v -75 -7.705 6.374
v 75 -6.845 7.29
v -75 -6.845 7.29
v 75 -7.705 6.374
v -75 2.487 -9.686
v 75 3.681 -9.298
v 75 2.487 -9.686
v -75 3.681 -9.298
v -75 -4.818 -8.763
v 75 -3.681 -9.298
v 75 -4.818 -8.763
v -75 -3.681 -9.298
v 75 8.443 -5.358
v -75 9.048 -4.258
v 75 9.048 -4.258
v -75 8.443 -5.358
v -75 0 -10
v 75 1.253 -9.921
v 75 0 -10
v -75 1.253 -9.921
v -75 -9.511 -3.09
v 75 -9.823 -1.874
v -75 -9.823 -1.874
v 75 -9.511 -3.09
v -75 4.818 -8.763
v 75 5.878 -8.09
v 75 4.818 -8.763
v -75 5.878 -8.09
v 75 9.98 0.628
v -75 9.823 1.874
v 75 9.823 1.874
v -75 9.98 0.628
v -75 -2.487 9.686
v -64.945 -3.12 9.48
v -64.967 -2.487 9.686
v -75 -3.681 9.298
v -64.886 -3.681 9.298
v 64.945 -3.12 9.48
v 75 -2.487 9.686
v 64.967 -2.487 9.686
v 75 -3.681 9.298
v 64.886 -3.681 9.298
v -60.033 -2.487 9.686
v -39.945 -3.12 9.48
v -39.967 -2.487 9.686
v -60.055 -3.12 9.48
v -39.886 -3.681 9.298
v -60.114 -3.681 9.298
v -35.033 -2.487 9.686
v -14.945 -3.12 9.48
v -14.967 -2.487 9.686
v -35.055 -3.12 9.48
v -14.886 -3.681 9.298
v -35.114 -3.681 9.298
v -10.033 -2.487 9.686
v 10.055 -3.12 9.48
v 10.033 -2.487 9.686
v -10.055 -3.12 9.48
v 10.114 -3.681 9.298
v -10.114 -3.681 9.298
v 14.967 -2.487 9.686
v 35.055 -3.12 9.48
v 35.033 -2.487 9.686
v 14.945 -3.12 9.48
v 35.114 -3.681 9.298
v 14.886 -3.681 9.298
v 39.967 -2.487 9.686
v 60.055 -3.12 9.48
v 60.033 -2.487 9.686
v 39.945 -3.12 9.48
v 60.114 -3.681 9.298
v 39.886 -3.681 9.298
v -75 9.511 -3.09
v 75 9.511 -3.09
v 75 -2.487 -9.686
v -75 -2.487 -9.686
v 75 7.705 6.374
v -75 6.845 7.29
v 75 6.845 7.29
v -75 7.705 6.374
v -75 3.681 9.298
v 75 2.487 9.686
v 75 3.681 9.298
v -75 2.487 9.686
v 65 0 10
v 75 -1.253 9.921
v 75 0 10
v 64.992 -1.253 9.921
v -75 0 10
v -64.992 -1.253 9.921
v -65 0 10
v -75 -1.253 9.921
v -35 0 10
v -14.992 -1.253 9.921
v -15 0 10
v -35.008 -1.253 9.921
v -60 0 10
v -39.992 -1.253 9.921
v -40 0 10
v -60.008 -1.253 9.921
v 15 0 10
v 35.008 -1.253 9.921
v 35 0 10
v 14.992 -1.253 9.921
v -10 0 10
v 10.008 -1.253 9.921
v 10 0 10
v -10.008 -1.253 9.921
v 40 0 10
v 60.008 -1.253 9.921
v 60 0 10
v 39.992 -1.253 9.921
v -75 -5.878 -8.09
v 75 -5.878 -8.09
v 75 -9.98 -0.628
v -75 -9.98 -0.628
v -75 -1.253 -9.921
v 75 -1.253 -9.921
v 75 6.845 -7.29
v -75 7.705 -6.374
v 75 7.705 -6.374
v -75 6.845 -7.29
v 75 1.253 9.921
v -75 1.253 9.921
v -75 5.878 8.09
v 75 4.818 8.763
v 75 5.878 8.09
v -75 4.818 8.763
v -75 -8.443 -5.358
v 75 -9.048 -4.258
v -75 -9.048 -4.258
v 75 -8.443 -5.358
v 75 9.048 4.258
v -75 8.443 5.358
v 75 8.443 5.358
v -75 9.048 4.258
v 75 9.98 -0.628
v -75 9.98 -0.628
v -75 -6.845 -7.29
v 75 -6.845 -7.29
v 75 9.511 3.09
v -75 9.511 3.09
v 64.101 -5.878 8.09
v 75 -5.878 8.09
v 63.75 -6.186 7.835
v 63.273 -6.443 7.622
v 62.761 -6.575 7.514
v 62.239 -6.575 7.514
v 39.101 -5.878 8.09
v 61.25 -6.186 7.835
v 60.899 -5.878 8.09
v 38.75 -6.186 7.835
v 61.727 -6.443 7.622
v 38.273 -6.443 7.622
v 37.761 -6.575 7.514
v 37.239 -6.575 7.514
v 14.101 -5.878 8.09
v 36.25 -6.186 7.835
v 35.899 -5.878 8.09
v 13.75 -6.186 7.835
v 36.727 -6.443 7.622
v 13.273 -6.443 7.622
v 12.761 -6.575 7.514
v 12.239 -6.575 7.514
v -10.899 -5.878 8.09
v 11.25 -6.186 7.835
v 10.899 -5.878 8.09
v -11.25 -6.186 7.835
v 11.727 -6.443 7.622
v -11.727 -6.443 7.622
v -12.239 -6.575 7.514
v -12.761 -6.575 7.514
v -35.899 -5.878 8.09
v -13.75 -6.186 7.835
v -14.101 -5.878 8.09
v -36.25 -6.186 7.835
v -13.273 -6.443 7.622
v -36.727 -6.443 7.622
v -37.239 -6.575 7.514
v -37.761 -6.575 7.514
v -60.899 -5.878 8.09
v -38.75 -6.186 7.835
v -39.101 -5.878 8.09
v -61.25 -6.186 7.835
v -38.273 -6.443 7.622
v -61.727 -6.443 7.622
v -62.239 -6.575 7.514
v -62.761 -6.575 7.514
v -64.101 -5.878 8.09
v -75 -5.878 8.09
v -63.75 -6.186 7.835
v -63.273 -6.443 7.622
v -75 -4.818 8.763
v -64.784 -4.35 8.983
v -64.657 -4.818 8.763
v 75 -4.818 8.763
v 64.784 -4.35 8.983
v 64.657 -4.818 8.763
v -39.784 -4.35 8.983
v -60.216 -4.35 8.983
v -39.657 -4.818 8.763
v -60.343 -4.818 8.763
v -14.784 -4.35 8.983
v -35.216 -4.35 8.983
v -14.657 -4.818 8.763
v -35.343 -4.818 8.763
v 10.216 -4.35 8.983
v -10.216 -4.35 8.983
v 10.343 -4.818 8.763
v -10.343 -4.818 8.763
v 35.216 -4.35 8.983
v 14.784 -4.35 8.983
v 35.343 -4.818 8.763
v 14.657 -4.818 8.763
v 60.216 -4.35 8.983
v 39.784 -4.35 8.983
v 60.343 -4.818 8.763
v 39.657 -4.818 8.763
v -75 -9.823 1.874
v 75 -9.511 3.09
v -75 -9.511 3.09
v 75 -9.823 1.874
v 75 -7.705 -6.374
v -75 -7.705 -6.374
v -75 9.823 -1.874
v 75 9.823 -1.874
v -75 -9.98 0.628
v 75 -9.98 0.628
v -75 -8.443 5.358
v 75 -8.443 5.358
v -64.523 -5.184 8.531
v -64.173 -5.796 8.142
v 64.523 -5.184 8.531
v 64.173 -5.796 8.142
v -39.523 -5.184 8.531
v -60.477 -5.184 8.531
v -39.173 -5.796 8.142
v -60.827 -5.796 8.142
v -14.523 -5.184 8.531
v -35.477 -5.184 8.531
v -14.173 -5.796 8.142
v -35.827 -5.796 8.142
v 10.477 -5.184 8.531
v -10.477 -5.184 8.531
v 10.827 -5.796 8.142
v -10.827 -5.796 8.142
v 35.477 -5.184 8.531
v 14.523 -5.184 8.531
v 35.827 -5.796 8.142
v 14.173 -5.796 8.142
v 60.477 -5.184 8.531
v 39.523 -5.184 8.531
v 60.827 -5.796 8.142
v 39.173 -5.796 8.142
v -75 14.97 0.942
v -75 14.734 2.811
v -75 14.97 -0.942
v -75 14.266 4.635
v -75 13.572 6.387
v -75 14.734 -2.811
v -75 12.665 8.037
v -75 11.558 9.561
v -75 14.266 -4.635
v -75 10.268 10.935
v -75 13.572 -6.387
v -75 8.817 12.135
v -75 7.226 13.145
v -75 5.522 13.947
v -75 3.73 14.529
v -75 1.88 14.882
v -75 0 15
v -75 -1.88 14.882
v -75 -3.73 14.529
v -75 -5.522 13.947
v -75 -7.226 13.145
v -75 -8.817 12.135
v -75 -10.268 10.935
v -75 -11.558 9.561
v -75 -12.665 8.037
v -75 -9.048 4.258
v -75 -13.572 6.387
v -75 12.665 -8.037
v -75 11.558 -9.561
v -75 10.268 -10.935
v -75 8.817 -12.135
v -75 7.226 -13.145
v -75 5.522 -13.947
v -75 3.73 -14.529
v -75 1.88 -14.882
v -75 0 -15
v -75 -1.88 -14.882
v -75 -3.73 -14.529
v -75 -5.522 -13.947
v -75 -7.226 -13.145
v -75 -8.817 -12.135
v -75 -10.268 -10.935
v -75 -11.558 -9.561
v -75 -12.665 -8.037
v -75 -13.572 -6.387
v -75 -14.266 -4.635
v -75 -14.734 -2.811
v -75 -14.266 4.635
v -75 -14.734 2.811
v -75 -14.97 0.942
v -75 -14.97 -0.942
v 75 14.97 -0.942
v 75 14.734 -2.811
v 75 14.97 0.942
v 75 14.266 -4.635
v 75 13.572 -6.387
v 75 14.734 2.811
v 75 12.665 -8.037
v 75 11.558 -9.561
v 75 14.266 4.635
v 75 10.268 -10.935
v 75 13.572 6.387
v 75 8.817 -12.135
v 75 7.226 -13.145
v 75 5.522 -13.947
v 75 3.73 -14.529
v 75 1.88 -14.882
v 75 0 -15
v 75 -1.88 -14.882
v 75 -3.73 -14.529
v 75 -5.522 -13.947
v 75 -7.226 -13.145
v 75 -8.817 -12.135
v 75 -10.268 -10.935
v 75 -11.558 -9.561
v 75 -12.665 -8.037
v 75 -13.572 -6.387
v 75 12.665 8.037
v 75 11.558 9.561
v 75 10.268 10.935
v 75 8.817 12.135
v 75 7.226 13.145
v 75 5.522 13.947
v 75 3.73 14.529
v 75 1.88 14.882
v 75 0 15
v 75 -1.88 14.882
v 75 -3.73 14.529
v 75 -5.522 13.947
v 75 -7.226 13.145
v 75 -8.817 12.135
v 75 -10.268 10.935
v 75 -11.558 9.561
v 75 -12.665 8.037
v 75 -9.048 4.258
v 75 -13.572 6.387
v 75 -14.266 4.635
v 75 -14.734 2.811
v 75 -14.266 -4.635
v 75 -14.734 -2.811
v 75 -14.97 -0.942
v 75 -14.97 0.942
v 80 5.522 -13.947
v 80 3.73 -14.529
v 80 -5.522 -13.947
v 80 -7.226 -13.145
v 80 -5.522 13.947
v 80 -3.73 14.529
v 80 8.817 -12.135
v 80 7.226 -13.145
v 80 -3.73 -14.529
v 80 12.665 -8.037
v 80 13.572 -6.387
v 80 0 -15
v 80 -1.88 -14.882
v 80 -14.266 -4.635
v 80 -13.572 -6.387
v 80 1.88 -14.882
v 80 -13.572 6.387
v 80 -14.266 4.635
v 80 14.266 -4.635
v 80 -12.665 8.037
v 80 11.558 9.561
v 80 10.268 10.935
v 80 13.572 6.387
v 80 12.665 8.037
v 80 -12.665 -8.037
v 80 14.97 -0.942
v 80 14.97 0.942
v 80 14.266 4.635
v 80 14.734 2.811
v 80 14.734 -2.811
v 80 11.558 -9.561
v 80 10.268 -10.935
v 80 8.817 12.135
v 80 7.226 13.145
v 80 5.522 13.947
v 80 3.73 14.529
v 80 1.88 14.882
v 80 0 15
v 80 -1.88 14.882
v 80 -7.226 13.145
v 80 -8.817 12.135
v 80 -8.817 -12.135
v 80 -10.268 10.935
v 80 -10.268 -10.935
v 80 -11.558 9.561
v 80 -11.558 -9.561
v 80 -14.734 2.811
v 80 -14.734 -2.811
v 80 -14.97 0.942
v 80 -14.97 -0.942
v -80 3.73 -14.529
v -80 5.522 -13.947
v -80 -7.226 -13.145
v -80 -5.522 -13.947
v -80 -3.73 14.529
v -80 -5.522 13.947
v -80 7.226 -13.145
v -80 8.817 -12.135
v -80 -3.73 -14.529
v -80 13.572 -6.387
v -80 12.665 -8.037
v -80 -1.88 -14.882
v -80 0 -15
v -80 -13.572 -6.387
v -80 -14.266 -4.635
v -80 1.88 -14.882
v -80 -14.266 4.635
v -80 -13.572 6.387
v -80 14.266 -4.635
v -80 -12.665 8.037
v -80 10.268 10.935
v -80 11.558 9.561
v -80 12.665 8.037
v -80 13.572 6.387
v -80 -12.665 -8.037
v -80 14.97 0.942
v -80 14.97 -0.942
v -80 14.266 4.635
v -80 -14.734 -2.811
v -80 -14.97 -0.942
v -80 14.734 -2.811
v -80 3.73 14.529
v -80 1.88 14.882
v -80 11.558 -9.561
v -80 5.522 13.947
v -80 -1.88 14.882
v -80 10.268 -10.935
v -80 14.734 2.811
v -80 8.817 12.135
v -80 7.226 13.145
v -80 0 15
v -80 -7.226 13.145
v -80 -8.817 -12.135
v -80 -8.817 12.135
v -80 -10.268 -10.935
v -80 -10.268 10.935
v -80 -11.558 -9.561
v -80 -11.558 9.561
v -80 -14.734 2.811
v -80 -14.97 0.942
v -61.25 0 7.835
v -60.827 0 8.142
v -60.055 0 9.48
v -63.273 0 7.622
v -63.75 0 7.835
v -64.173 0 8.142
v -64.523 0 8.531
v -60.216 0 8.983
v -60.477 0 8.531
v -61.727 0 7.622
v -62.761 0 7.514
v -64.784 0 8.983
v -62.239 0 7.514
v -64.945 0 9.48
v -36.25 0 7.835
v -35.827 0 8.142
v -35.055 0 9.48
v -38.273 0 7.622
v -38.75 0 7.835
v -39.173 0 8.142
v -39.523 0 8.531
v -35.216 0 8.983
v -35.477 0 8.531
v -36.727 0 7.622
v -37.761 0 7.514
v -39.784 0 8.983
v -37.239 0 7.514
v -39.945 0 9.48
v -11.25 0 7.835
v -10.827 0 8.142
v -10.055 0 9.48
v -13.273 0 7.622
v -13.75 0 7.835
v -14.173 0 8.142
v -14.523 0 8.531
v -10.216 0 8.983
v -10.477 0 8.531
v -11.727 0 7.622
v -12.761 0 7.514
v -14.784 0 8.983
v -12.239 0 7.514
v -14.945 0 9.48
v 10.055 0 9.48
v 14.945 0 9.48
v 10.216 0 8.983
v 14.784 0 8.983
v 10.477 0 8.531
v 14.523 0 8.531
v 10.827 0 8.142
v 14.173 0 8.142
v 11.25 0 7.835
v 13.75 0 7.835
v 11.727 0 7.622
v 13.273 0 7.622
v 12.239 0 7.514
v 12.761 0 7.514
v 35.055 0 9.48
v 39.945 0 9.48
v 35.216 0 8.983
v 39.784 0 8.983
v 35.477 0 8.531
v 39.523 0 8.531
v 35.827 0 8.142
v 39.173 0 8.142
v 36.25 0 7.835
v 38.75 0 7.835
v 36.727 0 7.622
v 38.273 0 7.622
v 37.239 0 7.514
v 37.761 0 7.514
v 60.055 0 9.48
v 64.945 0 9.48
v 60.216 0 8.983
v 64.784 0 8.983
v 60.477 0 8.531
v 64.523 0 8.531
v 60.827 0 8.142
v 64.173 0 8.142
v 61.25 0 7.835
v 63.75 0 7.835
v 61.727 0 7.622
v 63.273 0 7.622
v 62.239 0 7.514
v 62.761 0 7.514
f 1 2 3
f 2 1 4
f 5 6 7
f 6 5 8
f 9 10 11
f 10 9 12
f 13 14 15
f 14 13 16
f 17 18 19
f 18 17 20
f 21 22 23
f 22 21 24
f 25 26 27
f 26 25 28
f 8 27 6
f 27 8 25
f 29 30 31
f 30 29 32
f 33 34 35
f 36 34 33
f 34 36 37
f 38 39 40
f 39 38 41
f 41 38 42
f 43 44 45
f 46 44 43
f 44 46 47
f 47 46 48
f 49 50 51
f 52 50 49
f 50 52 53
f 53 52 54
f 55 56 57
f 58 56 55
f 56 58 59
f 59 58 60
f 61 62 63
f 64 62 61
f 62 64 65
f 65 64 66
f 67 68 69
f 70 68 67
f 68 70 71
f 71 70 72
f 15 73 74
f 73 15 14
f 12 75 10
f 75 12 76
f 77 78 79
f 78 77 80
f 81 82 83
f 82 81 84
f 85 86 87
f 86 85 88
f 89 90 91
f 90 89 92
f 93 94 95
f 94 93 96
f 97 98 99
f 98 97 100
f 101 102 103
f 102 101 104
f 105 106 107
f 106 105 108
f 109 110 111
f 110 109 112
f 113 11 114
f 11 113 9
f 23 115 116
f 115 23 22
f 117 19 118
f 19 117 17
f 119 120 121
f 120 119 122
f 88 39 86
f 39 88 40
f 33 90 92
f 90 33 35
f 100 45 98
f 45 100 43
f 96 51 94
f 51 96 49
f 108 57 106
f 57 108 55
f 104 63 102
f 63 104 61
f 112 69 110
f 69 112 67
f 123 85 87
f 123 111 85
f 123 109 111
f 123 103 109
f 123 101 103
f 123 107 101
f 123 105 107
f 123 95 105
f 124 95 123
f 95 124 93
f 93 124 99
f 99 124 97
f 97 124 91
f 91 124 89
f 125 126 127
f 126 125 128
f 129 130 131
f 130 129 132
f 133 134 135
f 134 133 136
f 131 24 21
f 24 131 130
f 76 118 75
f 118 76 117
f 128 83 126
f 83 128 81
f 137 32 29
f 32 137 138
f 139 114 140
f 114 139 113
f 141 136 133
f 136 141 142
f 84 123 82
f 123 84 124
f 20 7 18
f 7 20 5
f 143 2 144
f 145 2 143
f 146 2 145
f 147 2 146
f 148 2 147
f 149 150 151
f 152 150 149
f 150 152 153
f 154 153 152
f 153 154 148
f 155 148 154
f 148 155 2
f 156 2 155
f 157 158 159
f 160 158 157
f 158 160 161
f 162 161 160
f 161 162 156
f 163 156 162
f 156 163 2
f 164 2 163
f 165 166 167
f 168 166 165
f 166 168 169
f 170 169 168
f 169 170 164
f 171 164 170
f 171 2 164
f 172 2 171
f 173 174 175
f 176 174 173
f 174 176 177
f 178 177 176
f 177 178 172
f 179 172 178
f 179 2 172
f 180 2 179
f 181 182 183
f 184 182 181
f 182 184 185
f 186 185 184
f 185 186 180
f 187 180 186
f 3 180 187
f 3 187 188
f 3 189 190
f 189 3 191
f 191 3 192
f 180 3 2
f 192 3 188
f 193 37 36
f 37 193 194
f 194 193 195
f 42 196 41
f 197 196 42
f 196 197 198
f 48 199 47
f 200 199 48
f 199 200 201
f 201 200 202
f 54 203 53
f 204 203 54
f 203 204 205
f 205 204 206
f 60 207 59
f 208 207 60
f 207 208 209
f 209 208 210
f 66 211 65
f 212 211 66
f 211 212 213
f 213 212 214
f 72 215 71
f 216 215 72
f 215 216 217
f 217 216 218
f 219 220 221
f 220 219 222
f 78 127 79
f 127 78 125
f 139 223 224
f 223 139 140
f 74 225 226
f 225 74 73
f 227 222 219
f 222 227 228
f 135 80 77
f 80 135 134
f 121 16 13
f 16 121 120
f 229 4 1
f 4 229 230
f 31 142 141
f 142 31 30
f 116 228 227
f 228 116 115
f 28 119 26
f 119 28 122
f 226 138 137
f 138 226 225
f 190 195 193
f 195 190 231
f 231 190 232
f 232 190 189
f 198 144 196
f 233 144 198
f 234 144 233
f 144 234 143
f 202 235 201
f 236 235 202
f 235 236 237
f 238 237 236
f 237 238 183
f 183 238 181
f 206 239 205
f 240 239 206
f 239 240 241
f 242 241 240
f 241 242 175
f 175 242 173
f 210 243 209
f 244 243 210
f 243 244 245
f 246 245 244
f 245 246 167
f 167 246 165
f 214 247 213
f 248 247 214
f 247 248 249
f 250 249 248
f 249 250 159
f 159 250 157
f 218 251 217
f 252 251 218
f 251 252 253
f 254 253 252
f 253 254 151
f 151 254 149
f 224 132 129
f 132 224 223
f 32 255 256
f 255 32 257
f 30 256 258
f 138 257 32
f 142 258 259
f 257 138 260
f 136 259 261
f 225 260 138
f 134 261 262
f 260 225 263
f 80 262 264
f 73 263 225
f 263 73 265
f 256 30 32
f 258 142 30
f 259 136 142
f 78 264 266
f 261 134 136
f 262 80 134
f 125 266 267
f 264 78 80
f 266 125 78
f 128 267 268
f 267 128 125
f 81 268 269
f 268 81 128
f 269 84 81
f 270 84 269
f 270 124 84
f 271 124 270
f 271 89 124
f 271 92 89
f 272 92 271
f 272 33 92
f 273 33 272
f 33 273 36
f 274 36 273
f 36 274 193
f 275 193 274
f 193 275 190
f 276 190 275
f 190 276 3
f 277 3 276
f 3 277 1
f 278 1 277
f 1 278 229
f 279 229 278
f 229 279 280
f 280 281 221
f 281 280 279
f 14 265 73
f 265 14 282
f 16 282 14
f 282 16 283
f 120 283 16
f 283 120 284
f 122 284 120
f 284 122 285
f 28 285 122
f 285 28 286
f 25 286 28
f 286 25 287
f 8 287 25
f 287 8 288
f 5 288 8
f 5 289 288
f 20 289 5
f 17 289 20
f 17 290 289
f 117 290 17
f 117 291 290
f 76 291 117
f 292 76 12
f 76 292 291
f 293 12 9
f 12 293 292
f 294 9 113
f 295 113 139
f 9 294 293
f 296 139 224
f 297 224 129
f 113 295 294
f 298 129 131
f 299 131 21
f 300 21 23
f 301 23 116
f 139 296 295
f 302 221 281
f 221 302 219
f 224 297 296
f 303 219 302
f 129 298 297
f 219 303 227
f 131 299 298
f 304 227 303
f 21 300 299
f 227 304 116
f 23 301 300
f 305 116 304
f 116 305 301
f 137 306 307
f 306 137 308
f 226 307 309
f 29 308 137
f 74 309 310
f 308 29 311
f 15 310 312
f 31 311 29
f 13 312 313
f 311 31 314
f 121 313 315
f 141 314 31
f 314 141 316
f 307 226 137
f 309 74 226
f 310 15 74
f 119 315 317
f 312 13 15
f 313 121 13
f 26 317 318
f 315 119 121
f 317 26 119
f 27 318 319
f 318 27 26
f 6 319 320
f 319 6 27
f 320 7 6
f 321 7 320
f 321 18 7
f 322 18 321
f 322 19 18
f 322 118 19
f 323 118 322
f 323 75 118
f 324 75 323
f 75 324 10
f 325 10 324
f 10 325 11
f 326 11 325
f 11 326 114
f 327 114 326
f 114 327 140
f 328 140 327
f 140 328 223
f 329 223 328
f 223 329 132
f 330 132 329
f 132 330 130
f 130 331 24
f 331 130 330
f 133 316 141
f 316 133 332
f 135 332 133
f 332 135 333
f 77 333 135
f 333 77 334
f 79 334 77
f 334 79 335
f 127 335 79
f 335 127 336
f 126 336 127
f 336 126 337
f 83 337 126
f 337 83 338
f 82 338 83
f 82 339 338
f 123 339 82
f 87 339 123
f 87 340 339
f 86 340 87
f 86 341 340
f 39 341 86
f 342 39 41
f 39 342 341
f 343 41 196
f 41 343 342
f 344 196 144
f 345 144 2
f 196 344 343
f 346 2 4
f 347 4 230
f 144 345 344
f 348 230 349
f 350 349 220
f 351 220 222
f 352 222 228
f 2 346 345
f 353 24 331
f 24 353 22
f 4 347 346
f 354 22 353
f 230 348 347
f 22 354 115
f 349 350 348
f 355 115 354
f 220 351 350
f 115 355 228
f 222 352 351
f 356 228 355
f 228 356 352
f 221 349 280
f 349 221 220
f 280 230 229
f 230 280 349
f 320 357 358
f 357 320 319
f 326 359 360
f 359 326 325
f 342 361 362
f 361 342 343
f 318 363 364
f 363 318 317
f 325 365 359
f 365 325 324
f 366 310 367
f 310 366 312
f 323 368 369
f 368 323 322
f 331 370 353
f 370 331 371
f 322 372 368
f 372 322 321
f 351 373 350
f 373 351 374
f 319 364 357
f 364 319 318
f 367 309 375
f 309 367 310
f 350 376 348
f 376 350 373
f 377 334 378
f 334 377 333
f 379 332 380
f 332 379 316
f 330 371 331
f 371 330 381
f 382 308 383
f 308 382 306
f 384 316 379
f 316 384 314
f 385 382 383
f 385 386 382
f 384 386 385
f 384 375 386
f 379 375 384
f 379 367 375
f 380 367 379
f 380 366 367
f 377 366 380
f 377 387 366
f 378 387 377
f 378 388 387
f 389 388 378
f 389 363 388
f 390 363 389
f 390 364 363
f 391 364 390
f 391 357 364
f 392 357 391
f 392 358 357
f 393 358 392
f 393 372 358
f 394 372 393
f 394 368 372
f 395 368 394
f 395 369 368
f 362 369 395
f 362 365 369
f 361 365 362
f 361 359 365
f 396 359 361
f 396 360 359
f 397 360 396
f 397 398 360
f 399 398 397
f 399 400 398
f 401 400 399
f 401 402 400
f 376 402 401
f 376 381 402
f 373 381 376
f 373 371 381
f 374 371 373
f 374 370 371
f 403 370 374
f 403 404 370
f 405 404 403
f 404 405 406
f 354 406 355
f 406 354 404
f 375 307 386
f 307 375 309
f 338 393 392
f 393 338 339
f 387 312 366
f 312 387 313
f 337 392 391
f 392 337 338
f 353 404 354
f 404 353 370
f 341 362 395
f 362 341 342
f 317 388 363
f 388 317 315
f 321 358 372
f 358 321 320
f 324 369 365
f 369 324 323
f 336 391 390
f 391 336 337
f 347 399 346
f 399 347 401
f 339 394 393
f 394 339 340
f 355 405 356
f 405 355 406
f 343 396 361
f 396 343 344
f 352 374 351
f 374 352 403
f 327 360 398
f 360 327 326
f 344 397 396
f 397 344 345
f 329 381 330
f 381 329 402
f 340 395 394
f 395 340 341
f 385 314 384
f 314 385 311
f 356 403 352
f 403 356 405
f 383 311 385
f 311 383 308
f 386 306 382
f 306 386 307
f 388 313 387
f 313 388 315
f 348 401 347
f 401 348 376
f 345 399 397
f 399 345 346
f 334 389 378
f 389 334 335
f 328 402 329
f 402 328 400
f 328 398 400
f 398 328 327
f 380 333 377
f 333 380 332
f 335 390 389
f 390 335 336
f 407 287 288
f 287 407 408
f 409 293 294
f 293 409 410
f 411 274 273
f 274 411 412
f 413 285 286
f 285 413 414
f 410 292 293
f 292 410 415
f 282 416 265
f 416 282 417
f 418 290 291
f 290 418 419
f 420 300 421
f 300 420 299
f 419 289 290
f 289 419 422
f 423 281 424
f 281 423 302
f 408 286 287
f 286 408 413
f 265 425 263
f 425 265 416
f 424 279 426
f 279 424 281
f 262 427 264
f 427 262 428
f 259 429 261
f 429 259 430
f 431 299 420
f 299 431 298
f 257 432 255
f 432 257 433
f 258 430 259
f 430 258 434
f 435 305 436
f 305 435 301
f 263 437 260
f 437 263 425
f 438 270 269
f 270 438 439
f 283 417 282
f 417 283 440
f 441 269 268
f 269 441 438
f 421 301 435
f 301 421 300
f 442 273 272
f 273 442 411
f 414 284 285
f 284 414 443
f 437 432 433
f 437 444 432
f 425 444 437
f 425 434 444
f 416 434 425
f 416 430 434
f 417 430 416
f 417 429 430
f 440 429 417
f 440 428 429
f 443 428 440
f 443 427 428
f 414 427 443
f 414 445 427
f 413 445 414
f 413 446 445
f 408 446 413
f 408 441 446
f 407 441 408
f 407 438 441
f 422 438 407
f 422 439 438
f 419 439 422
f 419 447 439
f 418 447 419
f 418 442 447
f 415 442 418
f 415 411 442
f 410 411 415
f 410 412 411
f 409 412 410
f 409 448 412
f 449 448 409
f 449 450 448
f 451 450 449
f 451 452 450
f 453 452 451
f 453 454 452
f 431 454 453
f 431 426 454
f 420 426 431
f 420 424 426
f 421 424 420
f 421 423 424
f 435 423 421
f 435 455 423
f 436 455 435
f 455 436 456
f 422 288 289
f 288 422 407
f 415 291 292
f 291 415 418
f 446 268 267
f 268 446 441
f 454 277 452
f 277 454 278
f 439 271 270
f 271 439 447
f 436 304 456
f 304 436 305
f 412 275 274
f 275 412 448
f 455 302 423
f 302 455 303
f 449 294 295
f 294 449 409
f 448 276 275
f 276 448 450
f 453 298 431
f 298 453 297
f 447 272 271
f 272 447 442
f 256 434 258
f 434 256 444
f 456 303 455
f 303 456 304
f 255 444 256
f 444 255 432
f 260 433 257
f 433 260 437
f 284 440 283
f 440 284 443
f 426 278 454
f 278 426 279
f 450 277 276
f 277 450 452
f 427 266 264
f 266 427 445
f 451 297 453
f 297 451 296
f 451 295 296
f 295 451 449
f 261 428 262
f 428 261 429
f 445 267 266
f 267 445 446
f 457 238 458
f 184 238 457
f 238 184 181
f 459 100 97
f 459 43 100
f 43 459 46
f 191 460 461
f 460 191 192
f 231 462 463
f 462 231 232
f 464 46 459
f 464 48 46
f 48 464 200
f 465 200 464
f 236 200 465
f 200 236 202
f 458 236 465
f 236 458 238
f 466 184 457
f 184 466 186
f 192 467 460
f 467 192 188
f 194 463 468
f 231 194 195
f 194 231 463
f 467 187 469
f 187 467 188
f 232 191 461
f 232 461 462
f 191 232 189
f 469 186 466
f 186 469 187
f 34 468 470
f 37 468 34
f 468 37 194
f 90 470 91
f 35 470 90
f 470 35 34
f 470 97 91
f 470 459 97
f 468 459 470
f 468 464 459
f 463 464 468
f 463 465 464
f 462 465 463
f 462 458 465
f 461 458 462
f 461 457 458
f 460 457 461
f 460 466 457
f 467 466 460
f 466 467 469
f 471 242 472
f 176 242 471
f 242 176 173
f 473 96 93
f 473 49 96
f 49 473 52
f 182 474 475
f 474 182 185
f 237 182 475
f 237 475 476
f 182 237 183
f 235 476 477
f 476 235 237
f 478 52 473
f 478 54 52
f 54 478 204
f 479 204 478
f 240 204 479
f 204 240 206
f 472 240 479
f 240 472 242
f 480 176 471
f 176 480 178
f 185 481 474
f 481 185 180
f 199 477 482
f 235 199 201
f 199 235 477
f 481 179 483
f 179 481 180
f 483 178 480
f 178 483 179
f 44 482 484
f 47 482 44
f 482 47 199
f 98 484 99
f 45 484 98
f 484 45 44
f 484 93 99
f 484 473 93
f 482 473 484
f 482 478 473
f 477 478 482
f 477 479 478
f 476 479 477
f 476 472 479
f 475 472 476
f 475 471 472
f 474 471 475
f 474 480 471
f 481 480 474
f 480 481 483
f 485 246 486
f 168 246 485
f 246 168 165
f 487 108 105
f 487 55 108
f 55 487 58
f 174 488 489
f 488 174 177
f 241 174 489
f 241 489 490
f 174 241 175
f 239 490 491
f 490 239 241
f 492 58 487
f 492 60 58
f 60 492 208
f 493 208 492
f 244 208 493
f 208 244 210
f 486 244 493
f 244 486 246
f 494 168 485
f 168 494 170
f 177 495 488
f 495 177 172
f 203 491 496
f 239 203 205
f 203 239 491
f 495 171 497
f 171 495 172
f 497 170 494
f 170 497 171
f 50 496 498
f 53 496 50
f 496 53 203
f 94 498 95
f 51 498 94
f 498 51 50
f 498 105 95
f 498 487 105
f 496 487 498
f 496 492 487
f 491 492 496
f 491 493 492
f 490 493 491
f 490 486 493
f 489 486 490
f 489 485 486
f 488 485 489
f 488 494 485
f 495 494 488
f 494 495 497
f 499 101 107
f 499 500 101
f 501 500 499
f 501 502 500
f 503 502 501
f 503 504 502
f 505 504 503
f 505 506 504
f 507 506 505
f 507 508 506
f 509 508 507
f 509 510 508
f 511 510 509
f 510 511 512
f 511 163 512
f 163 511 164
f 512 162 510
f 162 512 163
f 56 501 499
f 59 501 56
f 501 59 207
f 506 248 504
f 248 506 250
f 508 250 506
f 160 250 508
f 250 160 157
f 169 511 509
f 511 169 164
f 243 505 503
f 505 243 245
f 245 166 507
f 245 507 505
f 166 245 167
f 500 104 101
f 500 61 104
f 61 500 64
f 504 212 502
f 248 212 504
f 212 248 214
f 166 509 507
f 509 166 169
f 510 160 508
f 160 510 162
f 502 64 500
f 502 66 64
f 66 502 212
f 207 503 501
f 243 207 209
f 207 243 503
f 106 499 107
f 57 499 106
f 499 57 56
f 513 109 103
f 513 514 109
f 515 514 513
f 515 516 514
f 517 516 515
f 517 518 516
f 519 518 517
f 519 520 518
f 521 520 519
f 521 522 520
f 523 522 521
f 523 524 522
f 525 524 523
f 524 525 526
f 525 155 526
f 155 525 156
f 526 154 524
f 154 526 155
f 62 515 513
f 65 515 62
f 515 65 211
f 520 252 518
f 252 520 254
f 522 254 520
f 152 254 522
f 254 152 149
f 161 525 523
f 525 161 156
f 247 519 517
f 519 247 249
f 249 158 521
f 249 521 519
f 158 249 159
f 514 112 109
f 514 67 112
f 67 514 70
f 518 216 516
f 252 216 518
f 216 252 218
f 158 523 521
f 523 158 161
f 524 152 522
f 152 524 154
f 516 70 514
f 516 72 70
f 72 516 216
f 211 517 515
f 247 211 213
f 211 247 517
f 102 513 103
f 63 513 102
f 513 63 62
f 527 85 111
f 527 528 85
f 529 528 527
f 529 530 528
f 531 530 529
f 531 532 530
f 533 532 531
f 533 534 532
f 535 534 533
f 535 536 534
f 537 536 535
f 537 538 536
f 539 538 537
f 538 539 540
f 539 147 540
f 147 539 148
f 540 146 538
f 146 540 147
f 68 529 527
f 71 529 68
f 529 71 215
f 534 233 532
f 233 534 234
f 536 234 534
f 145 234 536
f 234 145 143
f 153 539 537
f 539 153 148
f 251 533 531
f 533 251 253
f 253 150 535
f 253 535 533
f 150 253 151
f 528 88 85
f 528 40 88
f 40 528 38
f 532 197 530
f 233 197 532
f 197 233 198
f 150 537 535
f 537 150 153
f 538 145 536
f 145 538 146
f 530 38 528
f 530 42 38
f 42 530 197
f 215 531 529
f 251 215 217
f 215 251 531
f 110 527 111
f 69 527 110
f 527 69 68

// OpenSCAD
// Constants
num_outlets = 6;
manifold_diameter = 20;
manifold_length = 150;
outlet_diameter = 5;
flange_diameter = 30;
flange_thickness = 5;

// Main manifold
module manifold() {
    rotate([0, 90, 0])
        cylinder(h=manifold_length, d=manifold_diameter, center=true, $fn=50);
}

// Outlet
module outlet() {
    rotate([90, 0, 0])
        cylinder(h=manifold_diameter, d=outlet_diameter, center=false, $fn=30);
}

// Flange
module flange() {
    rotate([0, 90, 0])
        cylinder(h=flange_thickness, d=flange_diameter, center=true, $fn=50);
}

// Complete assembly
module gas_distribution_manifold() {
    difference() {
        union() {
            manifold();
            translate([manifold_length/2 + flange_thickness/2, 0, 0]) flange();
            translate([-manifold_length/2 - flange_thickness/2, 0, 0]) flange();
        }
        for (i = [0:num_outlets-1]) {
            translate([manifold_length/num_outlets * (i - (num_outlets-1)/2), 0, manifold_diameter/2])
                outlet();
        }
    }
}

// Render the manifold
gas_distribution_manifold();
